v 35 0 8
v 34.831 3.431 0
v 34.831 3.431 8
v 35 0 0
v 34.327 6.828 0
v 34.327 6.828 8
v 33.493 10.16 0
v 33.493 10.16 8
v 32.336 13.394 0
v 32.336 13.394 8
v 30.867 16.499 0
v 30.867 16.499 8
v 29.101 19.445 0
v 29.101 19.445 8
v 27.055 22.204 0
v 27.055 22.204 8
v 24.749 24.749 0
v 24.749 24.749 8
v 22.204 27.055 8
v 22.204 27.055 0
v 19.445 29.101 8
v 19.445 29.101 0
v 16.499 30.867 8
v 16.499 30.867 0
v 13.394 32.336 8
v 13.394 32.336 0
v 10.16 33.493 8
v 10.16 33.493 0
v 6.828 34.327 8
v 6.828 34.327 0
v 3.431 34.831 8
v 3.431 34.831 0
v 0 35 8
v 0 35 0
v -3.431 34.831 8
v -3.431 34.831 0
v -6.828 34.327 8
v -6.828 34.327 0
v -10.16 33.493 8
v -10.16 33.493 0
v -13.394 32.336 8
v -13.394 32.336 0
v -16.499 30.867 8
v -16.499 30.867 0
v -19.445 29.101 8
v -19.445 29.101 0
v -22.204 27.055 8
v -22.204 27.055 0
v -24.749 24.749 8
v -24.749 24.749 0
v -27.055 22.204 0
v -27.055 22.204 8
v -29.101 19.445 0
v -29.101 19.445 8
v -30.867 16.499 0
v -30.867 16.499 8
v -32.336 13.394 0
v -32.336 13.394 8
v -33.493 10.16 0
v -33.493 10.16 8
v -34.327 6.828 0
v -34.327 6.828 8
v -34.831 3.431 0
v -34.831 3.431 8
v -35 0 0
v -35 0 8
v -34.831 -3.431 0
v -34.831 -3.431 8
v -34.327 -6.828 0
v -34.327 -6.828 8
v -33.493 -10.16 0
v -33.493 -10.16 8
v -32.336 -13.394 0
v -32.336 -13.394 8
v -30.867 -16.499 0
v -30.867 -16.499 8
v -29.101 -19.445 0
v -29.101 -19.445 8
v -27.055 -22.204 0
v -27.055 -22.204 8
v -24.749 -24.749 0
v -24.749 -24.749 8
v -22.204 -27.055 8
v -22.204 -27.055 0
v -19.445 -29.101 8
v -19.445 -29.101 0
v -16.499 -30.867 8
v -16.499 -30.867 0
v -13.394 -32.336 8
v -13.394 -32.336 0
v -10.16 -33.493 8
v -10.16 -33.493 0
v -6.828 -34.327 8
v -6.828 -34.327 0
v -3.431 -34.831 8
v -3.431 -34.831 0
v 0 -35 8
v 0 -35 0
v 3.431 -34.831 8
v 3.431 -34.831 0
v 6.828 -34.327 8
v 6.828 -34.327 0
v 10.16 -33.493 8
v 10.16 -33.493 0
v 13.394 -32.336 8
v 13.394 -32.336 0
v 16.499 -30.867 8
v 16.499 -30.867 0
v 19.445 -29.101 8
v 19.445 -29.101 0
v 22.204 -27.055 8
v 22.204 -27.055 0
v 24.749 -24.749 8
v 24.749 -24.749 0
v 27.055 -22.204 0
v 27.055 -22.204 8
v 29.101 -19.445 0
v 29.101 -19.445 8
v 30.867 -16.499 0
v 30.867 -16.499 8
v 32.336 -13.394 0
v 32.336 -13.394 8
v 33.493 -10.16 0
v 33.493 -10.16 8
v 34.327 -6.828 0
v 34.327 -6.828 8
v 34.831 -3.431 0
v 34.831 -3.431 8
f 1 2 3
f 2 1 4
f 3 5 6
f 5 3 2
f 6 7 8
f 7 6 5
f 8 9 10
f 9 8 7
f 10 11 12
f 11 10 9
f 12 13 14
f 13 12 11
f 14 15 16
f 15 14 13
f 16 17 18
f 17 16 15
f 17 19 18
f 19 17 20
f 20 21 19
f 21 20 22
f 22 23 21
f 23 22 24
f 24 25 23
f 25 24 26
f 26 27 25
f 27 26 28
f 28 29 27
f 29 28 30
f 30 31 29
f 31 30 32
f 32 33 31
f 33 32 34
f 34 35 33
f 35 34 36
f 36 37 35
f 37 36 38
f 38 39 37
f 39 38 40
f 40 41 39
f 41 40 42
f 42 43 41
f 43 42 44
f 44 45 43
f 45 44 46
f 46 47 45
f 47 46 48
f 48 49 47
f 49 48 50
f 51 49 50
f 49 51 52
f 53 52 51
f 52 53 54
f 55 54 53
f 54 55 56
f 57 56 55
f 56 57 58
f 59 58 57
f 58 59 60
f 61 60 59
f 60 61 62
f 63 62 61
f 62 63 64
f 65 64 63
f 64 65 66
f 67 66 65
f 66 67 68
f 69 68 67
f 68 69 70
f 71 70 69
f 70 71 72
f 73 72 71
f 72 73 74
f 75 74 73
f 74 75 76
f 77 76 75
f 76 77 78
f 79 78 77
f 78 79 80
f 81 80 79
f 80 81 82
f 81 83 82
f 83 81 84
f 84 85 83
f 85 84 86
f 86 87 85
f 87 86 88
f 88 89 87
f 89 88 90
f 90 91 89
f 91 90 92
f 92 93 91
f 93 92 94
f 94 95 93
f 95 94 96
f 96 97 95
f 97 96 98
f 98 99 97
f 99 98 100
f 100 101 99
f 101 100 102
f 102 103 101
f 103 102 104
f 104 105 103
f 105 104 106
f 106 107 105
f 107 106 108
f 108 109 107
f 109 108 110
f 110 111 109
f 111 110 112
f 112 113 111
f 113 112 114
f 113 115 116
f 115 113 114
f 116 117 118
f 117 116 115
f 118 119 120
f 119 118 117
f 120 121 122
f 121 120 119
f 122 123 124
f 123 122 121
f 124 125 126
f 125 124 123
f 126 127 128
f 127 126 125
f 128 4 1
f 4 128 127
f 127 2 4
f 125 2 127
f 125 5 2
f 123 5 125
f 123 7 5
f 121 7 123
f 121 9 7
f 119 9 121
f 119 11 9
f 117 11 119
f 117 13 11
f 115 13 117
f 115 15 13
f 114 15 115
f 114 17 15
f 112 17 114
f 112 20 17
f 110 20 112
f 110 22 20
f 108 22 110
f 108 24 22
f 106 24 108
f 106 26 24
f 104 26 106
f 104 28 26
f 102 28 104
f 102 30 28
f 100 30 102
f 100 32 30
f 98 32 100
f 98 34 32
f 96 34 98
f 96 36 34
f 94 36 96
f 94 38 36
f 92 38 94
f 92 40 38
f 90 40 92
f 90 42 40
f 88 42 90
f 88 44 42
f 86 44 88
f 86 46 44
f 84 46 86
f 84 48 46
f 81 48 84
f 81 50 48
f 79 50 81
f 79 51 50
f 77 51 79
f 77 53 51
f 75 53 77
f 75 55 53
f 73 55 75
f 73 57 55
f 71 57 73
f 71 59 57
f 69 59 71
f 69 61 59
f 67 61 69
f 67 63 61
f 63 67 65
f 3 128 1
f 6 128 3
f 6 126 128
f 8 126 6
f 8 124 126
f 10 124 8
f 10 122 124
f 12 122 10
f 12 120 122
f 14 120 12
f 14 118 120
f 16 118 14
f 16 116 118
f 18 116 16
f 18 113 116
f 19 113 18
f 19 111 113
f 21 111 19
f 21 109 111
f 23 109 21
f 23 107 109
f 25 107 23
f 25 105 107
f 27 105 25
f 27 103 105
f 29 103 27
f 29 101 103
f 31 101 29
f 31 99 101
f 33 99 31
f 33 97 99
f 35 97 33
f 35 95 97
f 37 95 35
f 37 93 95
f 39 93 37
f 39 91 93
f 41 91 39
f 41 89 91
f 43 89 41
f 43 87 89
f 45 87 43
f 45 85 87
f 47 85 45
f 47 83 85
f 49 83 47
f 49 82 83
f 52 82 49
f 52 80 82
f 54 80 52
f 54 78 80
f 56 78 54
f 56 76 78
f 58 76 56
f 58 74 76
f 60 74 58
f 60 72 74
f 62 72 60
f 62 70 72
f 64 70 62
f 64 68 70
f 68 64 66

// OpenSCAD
// Starter file for task-010.
// Edit this file in OpenSCAD to complete the requested hard task.
$fn = 64;

carrier_d = 70;
carrier_h = 8;
cylinder(d=carrier_d, h=carrier_h);
